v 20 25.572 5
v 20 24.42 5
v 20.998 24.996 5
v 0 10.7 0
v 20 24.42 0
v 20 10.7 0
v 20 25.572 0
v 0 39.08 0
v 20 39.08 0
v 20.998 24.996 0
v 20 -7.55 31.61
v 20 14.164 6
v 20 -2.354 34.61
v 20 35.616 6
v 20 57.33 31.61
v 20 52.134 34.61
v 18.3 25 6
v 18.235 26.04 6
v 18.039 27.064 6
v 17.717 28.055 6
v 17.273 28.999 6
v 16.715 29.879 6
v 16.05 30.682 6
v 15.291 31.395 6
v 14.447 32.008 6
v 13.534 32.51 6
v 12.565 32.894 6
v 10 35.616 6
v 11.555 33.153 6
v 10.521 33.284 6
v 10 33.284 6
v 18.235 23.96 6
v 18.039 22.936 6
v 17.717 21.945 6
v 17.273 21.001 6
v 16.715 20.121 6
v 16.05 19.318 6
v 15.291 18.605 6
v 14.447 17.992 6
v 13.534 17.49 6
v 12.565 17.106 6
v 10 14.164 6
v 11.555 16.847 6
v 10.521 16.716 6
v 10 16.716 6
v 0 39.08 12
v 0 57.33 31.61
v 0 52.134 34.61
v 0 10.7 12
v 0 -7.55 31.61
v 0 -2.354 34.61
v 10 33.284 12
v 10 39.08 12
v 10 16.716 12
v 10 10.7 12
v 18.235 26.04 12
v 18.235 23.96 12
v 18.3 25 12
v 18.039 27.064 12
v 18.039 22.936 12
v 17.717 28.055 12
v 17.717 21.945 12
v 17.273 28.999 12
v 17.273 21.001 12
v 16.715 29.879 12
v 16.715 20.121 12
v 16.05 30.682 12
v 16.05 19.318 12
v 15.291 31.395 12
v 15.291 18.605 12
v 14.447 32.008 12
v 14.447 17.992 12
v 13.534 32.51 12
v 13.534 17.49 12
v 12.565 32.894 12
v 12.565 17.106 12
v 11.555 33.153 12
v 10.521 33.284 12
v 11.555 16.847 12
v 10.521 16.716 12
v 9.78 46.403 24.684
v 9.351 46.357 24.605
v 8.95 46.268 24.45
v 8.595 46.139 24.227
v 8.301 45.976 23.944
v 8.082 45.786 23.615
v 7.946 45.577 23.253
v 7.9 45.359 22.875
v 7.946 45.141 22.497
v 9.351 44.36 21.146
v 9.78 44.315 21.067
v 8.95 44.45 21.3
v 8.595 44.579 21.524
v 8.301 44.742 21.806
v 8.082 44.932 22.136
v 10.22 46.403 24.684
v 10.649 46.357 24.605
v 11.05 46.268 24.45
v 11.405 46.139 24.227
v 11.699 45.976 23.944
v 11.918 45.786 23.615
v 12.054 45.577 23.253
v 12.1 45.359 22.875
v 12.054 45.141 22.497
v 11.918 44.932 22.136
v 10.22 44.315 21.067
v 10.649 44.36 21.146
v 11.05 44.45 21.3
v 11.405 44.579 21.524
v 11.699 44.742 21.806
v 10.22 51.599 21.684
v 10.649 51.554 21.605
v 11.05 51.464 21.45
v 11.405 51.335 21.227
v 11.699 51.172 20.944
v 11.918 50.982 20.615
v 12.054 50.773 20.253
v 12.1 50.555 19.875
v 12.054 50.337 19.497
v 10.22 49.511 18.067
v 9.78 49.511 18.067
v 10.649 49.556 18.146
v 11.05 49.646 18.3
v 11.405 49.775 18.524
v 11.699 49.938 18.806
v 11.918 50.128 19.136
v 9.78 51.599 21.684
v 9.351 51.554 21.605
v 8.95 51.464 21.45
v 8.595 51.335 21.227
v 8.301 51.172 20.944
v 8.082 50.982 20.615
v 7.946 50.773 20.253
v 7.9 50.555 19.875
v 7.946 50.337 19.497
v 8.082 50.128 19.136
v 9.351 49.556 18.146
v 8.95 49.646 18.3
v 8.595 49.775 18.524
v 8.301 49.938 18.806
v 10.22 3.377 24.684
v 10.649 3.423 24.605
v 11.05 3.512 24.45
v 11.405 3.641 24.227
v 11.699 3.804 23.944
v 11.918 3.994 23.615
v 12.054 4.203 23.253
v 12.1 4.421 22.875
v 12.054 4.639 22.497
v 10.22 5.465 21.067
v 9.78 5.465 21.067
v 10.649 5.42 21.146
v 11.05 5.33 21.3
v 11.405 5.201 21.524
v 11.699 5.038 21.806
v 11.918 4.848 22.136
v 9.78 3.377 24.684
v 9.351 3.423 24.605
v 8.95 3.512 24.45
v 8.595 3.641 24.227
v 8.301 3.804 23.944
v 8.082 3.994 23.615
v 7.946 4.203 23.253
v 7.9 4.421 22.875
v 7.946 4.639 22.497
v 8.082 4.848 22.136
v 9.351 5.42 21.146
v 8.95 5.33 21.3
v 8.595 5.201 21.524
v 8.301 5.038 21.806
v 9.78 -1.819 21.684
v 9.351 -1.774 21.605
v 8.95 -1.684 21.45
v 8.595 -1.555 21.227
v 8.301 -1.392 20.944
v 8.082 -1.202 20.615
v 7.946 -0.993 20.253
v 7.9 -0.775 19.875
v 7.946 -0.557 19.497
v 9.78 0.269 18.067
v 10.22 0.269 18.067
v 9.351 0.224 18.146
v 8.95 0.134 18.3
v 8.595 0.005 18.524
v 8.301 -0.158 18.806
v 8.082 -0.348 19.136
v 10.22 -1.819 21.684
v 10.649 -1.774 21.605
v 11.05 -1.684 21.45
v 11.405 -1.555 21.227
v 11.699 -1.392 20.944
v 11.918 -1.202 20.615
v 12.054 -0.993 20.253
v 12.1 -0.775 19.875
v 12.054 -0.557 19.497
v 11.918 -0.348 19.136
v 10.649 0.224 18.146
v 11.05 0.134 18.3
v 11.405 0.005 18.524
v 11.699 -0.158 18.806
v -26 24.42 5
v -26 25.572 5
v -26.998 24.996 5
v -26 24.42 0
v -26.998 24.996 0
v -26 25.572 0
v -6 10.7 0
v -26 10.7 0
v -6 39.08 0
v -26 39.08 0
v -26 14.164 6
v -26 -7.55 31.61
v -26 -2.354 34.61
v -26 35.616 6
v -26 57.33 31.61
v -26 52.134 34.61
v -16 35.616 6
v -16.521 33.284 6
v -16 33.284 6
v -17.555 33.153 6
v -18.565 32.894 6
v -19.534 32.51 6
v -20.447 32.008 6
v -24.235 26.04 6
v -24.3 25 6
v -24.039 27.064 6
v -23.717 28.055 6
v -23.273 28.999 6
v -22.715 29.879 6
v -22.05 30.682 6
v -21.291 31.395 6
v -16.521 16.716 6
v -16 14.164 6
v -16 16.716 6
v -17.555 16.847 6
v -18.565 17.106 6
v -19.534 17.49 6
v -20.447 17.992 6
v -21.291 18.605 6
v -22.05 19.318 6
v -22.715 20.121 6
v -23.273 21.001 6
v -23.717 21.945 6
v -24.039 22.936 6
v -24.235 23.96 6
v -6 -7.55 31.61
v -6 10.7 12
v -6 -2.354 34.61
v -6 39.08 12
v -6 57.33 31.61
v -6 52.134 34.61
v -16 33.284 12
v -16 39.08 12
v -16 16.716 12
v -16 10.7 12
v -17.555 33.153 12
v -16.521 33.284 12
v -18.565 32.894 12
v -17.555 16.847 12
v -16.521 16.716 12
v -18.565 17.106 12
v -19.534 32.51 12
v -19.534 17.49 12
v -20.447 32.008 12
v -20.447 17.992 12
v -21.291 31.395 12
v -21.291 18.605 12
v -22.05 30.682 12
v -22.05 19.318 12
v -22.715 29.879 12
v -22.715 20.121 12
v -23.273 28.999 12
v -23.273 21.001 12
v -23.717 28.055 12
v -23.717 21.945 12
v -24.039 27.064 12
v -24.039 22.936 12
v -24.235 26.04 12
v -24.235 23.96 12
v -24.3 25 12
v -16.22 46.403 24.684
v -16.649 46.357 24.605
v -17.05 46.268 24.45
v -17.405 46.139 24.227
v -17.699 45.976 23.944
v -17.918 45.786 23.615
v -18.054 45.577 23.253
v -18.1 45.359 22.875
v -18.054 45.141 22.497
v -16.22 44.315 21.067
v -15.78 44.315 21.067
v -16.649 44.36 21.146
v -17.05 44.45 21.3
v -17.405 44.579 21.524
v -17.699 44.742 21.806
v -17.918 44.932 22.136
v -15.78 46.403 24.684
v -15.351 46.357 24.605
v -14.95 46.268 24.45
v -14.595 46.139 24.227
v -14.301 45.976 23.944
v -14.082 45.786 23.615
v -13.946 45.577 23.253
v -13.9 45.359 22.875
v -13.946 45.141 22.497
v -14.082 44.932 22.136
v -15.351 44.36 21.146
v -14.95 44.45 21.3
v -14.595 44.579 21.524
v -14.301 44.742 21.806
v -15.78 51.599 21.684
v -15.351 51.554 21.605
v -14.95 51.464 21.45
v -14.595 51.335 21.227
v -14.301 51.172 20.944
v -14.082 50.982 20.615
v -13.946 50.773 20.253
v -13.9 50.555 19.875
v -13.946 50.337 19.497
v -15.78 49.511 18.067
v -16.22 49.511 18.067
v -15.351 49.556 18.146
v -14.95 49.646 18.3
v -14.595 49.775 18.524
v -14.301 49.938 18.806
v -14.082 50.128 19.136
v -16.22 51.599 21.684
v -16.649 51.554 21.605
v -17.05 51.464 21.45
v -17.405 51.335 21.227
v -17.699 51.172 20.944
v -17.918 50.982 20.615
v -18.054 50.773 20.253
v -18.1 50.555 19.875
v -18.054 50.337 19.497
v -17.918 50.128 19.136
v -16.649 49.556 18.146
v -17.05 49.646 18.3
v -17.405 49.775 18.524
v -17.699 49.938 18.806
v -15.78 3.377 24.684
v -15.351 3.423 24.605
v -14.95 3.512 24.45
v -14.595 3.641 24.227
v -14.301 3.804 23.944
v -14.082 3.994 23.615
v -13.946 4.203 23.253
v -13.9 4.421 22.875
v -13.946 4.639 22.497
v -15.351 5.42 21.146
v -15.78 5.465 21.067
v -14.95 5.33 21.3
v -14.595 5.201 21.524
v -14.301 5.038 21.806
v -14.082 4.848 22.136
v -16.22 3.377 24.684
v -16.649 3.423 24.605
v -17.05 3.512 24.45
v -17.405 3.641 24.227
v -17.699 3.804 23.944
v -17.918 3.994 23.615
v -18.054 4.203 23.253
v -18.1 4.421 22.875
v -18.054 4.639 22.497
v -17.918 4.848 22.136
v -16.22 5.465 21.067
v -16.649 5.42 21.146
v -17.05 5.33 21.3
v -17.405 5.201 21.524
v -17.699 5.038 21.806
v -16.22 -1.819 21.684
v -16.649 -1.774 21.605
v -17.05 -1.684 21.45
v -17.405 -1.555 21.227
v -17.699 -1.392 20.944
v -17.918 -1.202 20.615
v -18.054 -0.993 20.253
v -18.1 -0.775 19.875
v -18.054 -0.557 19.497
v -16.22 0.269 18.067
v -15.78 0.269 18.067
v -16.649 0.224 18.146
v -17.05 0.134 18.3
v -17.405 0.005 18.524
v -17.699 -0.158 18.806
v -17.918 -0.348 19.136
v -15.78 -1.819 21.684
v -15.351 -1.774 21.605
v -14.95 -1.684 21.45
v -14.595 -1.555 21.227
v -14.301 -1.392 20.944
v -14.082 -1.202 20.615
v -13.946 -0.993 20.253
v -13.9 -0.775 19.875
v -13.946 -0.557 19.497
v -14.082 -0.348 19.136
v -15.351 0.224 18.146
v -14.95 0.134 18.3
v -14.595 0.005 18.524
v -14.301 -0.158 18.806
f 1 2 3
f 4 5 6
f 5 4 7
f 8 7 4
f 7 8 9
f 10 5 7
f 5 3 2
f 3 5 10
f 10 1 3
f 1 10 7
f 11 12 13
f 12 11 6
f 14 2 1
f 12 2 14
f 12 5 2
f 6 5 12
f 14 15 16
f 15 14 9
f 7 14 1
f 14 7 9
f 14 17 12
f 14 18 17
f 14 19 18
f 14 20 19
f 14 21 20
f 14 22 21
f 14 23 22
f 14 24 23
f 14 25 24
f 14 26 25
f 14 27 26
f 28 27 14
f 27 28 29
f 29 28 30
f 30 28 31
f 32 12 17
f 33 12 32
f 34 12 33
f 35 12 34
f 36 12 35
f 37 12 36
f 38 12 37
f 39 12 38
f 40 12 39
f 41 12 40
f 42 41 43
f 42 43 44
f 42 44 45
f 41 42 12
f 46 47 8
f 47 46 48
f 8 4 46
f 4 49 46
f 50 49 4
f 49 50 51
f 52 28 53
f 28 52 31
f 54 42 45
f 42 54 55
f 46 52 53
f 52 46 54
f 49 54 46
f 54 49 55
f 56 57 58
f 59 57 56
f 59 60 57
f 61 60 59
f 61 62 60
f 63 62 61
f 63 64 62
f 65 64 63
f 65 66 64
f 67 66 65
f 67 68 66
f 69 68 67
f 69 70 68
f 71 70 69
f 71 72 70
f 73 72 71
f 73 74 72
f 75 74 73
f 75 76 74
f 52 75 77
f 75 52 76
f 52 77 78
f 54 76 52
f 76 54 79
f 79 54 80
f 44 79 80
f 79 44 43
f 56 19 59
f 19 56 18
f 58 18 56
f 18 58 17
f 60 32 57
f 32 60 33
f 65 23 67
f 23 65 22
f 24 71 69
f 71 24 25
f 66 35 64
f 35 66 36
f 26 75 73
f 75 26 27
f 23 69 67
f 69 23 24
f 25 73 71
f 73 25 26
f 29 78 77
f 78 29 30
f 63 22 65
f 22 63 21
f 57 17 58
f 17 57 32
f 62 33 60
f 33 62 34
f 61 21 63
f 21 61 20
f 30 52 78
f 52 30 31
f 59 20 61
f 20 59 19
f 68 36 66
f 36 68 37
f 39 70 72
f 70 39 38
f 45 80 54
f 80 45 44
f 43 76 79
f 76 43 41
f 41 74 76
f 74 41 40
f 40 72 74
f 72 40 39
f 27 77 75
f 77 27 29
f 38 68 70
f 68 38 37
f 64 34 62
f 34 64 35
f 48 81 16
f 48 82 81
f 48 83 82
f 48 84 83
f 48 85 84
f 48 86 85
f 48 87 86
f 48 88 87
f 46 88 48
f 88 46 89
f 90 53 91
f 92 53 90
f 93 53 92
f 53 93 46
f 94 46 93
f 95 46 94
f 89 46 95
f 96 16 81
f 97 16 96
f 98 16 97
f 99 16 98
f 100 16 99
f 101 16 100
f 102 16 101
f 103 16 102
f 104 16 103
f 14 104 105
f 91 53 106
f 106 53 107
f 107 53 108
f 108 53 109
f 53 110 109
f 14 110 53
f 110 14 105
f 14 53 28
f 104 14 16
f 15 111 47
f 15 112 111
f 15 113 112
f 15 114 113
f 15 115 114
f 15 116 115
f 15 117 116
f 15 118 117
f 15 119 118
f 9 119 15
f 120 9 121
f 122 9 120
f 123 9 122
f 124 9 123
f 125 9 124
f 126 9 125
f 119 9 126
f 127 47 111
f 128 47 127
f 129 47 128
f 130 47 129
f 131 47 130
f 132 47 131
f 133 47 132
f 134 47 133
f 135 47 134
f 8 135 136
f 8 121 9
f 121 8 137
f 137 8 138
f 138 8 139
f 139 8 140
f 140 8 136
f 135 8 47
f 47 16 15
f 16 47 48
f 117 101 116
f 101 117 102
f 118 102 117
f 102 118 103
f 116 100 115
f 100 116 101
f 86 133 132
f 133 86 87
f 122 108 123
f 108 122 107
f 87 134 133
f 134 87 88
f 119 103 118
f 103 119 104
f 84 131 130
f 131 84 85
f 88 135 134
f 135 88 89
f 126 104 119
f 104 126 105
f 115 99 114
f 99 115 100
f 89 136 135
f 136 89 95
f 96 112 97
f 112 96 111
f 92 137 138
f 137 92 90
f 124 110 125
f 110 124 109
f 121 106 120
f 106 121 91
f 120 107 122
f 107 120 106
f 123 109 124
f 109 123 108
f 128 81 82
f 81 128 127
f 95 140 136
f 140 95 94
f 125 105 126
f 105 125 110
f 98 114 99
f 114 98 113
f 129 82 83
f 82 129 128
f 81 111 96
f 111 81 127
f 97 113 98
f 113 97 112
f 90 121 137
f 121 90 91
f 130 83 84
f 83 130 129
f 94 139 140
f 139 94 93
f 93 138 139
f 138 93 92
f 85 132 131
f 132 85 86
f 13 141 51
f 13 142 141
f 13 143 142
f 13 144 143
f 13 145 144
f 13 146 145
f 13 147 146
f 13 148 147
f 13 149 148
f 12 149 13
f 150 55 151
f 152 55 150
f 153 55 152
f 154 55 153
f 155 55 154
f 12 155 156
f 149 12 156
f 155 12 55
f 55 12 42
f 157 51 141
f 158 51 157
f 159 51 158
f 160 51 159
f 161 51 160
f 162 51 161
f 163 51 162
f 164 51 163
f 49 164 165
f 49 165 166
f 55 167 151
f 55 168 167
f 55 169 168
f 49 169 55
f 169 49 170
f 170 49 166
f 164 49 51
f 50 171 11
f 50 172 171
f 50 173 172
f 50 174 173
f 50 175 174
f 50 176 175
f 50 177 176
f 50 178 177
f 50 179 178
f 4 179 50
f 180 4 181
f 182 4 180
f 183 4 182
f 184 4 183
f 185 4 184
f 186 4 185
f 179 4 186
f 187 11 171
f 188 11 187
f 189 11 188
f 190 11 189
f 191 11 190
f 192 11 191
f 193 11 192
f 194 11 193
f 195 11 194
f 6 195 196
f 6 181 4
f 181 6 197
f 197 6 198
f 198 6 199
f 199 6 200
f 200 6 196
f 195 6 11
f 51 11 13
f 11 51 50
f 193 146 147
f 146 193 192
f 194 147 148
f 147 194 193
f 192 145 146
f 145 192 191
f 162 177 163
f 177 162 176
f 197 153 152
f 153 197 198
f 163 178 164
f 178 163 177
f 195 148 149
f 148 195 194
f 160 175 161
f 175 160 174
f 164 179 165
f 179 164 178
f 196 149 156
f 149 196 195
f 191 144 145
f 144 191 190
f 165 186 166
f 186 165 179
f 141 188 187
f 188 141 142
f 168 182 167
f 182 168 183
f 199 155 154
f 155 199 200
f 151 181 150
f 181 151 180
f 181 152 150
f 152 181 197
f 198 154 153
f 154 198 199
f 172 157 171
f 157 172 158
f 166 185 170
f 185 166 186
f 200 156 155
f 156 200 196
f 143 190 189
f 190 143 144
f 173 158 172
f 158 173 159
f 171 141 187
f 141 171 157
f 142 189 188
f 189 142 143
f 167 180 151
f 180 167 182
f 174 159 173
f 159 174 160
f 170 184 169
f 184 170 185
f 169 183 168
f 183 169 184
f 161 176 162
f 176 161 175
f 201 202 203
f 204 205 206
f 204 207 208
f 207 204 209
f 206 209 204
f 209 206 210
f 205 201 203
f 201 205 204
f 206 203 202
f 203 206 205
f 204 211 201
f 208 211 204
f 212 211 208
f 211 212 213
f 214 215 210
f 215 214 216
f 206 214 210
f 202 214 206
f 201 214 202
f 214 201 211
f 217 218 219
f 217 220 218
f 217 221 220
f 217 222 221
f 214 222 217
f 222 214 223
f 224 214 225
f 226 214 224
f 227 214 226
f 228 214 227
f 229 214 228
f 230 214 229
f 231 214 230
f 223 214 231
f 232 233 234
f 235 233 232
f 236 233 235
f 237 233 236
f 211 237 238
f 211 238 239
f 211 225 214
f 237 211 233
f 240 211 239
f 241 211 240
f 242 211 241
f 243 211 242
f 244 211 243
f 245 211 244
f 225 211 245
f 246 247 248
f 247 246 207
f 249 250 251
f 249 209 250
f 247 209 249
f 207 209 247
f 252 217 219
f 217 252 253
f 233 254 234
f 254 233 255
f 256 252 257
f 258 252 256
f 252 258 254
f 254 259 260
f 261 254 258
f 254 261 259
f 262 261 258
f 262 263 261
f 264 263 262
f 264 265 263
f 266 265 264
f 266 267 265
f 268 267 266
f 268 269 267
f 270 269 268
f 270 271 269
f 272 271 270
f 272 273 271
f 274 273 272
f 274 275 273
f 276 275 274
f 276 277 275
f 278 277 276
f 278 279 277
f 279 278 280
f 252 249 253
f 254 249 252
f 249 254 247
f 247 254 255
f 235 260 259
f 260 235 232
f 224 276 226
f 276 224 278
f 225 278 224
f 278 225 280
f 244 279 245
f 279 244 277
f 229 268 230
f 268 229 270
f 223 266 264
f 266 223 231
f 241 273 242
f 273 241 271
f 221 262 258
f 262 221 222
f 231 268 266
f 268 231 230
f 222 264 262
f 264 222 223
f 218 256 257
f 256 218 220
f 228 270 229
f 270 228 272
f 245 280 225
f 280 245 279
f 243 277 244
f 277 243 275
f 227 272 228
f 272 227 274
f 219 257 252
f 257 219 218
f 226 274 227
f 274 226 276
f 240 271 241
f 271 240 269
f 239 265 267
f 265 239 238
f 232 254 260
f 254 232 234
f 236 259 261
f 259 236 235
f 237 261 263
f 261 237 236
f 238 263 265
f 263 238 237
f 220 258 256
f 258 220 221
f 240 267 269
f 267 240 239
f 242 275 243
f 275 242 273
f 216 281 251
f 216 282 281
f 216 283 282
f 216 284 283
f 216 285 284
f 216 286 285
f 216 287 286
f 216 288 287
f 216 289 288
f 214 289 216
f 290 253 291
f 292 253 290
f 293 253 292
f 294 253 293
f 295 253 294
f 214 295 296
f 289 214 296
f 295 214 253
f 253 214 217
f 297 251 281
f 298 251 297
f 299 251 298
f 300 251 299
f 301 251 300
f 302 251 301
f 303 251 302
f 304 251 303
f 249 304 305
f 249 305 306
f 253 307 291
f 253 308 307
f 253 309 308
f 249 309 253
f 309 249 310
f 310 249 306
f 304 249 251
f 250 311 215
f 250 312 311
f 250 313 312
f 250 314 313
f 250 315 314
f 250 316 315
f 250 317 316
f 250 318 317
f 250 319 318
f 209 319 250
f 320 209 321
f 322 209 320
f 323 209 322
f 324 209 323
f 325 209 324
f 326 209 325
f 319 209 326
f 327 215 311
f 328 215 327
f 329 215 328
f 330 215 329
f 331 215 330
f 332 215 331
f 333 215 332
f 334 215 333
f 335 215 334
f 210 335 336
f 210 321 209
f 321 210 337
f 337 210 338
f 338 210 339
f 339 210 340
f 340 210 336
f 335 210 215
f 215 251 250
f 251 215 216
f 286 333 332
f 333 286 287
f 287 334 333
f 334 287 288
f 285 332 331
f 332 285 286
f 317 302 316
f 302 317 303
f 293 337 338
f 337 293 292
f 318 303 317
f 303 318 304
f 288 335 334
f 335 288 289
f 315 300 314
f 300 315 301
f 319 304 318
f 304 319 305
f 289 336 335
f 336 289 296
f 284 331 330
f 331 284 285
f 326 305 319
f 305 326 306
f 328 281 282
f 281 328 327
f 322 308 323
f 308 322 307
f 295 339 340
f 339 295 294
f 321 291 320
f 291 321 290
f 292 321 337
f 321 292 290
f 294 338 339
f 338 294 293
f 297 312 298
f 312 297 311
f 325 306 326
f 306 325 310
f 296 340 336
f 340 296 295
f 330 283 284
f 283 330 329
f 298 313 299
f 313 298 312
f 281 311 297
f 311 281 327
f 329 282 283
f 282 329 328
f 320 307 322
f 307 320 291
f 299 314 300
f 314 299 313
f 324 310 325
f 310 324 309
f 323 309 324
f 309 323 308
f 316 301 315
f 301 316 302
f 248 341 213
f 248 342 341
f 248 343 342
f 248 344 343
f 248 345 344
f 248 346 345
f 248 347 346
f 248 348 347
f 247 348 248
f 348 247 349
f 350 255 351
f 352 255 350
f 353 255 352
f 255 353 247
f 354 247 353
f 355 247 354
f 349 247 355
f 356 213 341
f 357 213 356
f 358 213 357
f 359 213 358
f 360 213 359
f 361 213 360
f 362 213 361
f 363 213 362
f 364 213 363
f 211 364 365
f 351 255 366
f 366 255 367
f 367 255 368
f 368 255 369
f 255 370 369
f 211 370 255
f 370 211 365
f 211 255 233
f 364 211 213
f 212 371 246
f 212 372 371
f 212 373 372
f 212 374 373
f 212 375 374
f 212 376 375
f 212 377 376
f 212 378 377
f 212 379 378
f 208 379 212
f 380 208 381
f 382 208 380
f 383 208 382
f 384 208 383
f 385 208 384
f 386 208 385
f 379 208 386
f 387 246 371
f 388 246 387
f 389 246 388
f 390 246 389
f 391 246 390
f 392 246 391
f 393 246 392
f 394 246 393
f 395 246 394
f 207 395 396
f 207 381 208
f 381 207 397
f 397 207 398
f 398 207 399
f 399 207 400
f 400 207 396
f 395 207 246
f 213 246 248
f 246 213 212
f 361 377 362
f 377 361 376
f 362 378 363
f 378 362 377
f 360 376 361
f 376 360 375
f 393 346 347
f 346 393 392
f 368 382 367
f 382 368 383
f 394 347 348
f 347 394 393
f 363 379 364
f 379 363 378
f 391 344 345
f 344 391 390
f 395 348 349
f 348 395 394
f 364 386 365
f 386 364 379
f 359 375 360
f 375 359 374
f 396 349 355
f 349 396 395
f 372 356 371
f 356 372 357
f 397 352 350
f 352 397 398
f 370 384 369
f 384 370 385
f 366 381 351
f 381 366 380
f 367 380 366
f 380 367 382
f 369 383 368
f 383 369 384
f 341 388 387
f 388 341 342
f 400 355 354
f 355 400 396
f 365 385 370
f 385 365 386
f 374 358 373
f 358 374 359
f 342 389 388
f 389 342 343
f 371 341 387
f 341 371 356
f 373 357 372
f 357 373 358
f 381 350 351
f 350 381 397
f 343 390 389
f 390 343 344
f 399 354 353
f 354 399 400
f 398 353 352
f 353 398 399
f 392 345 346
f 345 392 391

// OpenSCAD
// file: functions.scad
// PRUSA Mendel  
// Functions used in many files
// GNU GPL v2
// Josef Průša
// josefprusa@me.com
// prusadjs.cz
// http://www.reprap.org/wiki/Prusa_Mendel
// http://github.com/prusajr/PrusaMendel

module nut(d,h,horizontal=true){
cornerdiameter =  (d / 2) / cos (180 / 6);
cylinder(h = h, r = cornerdiameter, $fn = 6);
if(horizontal){
for(i = [1:6]){
	rotate([0,0,60*i]) translate([-cornerdiameter-0.2,0,0]) rotate([0,0,-45]) cube(size = [2,2,h]);
}}
}

// By nophead
module polyhole(d,h) {
    n = max(round(2 * d),3);
    rotate([0,0,180])
        cylinder(h = h, r = (d / 2) / cos (180 / n), $fn = n);
}

module roundcorner(diameter){
	difference(){
		cube(size = [diameter,diameter,99], center = false);
		translate(v = [diameter, diameter, 0]) cylinder(h = 100, r=diameter, center=true);
	}
}
// file: metric.scad
// PRUSA Mendel  
// Default metric sizes
// GNU GPL v2
// Josef Průša
// josefprusa@me.com
// prusadjs.cz
// http://www.reprap.org/wiki/Prusa_Mendel
// http://github.com/prusajr/PrusaMendel

// DONT CHANGE THIS FILE! ALTER VALUES IN CONFIGURATION.SCAD INSTEAD

// RODS

threaded_rod_diameter = 8;
threaded_rod_diameter_horizontal = 8;
smooth_bar_diameter = 8;
smooth_bar_diameter_horizontal = 8;

// Nuts and bolts

m8_diameter = 8;
m8_nut_diameter = 14.5;

m4_diameter = 4;
m4_nut_diameter = 7.5;

m3_diameter = 3;
m3_nut_diameter = 5;

// Bushing holder

bushing_core_diameter = smooth_bar_diameter;
bushing_material_thickness = 1;

// Motors

motor_shaft = 5.1;
// file: configuration.scad
// PRUSA Mendel  
// Configuration file
// GNU GPL v2
// Josef Průša
// josefprusa@me.com
// prusadjs.cz
// http://www.reprap.org/wiki/Prusa_Mendel
// http://github.com/prusajr/PrusaMendel

// PLEASE SELECT ONE OF THE CONFIGURATIONS BELOW
// BY UN-COMMENTING IT

// Uncomment for metric settings
// METRIC METRIC METRIC METRIC METRIC METRIC METRIC METRIC 

include <metric.scad>;

// Uncomment for imperial settings
// IMPERIAL IMPERIAL IMPERIAL IMPERIAL IMPERIAL IMPERIAL IMPERIAL 

//include <sae.scad>;

//thin_wall = 3;
// LM8UU
//linear = false;

// override settings by customizing below
// CUSTOM CUSTOM CUSTOM CUSTOM CUSTOM CUSTOM CUSTOM CUSTOM CUSTOM

threaded_rod_diameter = 8.2;
threaded_rod_diameter_horizontal = 8.2;
smooth_bar_diameter = 8.3;
smooth_bar_diameter_horizontal = 8.3;

// Nuts and bolts

m8_diameter = 8.3;
m8_nut_diameter = 15;

m4_diameter = 4.2;
m4_nut_diameter = 9;

m3_diameter = 3.3;
m3_nut_diameter = 5.8;

///counted stuff
m3_nut_diameter_bigger = ((m3_nut_diameter  / 2) / cos (180 / 6))*2;

// functions 
include <functions.scad>
// main file
// C. Strang		
// cstrang@????
// funfor.us
// f. beachler
// longevity software d.b.a. terawatt industries

include <configuration.scad>;

m3=m3_diameter;
m3n=m3_nut_diameter;
m4=m4_diameter ; 

h = 6;       	// base thickness
mh = h-1;			// marker height
o = 0.1;			//  overlap amount
hh = 6;				// bar holder height
m=m4_diameter;	// attachment hole diameter;
st=-1;				// slot depth 2=normal, -1 = none
rh=smooth_bar_diameter_horizontal;

$fn=30;

translate([0,0,0]) ztopholder(m,h,hh,st,mh,rh);
translate([-6,0,0]) mirror() ztopholder(m,h,hh,st,mh,rh);

module ztopholder(ztm,zth,zthh,ztst,ztmh,ztrh)
{
	difference()
	{
		union()
		{
			translate([0,10.7,0]) cube([20,28.38,zth]);
			translate([20-o,24.4,0]) marker(ztmh);
			//rod holder frame
			translate([0,10.7,zth-o]) rotate([0,0,0]) cube([10,28.38,zthh+o]);
			translate([10,25,zth-o]) cylinder(r=(ztrh),h=zthh+o,$fn=50);

			//translate([0,25,zth-o]) rodholder(zthh);
		}
	}
	translate([0,39.08,0]) rotate([60,0,0]) slantbase(zthh,ztst,ztm);
	translate([0,10.7,0]) mirror([0,1,0]) rotate([60,0,0]) slantbase(zthh,ztst,ztm);
}

module marker(mmh)
{
	difference()
	{
		cube([1.1,1.2,mmh]);
		translate([1,-1.77,-o]) rotate([0,0,30]) cube([2,2,mmh+2*o]);
		translate([0,1.23,-o]) rotate([0,0,-30]) cube([2,2,mmh+2*o]);
	}
}

module slantbase(sbhh,sbst,sbm)
{
	difference()
	{
		translate([0,0,0]) rotate([0,0,0]) cube([20,21.5 + 15,sbhh]);
		translate([10,15.45 + 15 / 2,-o]) rotate([0,0,0]) cylinder(r=sbm/2,h=sbhh+2*o);
	}
	difference()
	{
		translate([7.5,0,-sbst]) cube([5,11,sbst+o]);
		translate([7.4,-2.42,0]) rotate([-60,0,0]) cube([5.2,11,sbst+o]);
	}



}
